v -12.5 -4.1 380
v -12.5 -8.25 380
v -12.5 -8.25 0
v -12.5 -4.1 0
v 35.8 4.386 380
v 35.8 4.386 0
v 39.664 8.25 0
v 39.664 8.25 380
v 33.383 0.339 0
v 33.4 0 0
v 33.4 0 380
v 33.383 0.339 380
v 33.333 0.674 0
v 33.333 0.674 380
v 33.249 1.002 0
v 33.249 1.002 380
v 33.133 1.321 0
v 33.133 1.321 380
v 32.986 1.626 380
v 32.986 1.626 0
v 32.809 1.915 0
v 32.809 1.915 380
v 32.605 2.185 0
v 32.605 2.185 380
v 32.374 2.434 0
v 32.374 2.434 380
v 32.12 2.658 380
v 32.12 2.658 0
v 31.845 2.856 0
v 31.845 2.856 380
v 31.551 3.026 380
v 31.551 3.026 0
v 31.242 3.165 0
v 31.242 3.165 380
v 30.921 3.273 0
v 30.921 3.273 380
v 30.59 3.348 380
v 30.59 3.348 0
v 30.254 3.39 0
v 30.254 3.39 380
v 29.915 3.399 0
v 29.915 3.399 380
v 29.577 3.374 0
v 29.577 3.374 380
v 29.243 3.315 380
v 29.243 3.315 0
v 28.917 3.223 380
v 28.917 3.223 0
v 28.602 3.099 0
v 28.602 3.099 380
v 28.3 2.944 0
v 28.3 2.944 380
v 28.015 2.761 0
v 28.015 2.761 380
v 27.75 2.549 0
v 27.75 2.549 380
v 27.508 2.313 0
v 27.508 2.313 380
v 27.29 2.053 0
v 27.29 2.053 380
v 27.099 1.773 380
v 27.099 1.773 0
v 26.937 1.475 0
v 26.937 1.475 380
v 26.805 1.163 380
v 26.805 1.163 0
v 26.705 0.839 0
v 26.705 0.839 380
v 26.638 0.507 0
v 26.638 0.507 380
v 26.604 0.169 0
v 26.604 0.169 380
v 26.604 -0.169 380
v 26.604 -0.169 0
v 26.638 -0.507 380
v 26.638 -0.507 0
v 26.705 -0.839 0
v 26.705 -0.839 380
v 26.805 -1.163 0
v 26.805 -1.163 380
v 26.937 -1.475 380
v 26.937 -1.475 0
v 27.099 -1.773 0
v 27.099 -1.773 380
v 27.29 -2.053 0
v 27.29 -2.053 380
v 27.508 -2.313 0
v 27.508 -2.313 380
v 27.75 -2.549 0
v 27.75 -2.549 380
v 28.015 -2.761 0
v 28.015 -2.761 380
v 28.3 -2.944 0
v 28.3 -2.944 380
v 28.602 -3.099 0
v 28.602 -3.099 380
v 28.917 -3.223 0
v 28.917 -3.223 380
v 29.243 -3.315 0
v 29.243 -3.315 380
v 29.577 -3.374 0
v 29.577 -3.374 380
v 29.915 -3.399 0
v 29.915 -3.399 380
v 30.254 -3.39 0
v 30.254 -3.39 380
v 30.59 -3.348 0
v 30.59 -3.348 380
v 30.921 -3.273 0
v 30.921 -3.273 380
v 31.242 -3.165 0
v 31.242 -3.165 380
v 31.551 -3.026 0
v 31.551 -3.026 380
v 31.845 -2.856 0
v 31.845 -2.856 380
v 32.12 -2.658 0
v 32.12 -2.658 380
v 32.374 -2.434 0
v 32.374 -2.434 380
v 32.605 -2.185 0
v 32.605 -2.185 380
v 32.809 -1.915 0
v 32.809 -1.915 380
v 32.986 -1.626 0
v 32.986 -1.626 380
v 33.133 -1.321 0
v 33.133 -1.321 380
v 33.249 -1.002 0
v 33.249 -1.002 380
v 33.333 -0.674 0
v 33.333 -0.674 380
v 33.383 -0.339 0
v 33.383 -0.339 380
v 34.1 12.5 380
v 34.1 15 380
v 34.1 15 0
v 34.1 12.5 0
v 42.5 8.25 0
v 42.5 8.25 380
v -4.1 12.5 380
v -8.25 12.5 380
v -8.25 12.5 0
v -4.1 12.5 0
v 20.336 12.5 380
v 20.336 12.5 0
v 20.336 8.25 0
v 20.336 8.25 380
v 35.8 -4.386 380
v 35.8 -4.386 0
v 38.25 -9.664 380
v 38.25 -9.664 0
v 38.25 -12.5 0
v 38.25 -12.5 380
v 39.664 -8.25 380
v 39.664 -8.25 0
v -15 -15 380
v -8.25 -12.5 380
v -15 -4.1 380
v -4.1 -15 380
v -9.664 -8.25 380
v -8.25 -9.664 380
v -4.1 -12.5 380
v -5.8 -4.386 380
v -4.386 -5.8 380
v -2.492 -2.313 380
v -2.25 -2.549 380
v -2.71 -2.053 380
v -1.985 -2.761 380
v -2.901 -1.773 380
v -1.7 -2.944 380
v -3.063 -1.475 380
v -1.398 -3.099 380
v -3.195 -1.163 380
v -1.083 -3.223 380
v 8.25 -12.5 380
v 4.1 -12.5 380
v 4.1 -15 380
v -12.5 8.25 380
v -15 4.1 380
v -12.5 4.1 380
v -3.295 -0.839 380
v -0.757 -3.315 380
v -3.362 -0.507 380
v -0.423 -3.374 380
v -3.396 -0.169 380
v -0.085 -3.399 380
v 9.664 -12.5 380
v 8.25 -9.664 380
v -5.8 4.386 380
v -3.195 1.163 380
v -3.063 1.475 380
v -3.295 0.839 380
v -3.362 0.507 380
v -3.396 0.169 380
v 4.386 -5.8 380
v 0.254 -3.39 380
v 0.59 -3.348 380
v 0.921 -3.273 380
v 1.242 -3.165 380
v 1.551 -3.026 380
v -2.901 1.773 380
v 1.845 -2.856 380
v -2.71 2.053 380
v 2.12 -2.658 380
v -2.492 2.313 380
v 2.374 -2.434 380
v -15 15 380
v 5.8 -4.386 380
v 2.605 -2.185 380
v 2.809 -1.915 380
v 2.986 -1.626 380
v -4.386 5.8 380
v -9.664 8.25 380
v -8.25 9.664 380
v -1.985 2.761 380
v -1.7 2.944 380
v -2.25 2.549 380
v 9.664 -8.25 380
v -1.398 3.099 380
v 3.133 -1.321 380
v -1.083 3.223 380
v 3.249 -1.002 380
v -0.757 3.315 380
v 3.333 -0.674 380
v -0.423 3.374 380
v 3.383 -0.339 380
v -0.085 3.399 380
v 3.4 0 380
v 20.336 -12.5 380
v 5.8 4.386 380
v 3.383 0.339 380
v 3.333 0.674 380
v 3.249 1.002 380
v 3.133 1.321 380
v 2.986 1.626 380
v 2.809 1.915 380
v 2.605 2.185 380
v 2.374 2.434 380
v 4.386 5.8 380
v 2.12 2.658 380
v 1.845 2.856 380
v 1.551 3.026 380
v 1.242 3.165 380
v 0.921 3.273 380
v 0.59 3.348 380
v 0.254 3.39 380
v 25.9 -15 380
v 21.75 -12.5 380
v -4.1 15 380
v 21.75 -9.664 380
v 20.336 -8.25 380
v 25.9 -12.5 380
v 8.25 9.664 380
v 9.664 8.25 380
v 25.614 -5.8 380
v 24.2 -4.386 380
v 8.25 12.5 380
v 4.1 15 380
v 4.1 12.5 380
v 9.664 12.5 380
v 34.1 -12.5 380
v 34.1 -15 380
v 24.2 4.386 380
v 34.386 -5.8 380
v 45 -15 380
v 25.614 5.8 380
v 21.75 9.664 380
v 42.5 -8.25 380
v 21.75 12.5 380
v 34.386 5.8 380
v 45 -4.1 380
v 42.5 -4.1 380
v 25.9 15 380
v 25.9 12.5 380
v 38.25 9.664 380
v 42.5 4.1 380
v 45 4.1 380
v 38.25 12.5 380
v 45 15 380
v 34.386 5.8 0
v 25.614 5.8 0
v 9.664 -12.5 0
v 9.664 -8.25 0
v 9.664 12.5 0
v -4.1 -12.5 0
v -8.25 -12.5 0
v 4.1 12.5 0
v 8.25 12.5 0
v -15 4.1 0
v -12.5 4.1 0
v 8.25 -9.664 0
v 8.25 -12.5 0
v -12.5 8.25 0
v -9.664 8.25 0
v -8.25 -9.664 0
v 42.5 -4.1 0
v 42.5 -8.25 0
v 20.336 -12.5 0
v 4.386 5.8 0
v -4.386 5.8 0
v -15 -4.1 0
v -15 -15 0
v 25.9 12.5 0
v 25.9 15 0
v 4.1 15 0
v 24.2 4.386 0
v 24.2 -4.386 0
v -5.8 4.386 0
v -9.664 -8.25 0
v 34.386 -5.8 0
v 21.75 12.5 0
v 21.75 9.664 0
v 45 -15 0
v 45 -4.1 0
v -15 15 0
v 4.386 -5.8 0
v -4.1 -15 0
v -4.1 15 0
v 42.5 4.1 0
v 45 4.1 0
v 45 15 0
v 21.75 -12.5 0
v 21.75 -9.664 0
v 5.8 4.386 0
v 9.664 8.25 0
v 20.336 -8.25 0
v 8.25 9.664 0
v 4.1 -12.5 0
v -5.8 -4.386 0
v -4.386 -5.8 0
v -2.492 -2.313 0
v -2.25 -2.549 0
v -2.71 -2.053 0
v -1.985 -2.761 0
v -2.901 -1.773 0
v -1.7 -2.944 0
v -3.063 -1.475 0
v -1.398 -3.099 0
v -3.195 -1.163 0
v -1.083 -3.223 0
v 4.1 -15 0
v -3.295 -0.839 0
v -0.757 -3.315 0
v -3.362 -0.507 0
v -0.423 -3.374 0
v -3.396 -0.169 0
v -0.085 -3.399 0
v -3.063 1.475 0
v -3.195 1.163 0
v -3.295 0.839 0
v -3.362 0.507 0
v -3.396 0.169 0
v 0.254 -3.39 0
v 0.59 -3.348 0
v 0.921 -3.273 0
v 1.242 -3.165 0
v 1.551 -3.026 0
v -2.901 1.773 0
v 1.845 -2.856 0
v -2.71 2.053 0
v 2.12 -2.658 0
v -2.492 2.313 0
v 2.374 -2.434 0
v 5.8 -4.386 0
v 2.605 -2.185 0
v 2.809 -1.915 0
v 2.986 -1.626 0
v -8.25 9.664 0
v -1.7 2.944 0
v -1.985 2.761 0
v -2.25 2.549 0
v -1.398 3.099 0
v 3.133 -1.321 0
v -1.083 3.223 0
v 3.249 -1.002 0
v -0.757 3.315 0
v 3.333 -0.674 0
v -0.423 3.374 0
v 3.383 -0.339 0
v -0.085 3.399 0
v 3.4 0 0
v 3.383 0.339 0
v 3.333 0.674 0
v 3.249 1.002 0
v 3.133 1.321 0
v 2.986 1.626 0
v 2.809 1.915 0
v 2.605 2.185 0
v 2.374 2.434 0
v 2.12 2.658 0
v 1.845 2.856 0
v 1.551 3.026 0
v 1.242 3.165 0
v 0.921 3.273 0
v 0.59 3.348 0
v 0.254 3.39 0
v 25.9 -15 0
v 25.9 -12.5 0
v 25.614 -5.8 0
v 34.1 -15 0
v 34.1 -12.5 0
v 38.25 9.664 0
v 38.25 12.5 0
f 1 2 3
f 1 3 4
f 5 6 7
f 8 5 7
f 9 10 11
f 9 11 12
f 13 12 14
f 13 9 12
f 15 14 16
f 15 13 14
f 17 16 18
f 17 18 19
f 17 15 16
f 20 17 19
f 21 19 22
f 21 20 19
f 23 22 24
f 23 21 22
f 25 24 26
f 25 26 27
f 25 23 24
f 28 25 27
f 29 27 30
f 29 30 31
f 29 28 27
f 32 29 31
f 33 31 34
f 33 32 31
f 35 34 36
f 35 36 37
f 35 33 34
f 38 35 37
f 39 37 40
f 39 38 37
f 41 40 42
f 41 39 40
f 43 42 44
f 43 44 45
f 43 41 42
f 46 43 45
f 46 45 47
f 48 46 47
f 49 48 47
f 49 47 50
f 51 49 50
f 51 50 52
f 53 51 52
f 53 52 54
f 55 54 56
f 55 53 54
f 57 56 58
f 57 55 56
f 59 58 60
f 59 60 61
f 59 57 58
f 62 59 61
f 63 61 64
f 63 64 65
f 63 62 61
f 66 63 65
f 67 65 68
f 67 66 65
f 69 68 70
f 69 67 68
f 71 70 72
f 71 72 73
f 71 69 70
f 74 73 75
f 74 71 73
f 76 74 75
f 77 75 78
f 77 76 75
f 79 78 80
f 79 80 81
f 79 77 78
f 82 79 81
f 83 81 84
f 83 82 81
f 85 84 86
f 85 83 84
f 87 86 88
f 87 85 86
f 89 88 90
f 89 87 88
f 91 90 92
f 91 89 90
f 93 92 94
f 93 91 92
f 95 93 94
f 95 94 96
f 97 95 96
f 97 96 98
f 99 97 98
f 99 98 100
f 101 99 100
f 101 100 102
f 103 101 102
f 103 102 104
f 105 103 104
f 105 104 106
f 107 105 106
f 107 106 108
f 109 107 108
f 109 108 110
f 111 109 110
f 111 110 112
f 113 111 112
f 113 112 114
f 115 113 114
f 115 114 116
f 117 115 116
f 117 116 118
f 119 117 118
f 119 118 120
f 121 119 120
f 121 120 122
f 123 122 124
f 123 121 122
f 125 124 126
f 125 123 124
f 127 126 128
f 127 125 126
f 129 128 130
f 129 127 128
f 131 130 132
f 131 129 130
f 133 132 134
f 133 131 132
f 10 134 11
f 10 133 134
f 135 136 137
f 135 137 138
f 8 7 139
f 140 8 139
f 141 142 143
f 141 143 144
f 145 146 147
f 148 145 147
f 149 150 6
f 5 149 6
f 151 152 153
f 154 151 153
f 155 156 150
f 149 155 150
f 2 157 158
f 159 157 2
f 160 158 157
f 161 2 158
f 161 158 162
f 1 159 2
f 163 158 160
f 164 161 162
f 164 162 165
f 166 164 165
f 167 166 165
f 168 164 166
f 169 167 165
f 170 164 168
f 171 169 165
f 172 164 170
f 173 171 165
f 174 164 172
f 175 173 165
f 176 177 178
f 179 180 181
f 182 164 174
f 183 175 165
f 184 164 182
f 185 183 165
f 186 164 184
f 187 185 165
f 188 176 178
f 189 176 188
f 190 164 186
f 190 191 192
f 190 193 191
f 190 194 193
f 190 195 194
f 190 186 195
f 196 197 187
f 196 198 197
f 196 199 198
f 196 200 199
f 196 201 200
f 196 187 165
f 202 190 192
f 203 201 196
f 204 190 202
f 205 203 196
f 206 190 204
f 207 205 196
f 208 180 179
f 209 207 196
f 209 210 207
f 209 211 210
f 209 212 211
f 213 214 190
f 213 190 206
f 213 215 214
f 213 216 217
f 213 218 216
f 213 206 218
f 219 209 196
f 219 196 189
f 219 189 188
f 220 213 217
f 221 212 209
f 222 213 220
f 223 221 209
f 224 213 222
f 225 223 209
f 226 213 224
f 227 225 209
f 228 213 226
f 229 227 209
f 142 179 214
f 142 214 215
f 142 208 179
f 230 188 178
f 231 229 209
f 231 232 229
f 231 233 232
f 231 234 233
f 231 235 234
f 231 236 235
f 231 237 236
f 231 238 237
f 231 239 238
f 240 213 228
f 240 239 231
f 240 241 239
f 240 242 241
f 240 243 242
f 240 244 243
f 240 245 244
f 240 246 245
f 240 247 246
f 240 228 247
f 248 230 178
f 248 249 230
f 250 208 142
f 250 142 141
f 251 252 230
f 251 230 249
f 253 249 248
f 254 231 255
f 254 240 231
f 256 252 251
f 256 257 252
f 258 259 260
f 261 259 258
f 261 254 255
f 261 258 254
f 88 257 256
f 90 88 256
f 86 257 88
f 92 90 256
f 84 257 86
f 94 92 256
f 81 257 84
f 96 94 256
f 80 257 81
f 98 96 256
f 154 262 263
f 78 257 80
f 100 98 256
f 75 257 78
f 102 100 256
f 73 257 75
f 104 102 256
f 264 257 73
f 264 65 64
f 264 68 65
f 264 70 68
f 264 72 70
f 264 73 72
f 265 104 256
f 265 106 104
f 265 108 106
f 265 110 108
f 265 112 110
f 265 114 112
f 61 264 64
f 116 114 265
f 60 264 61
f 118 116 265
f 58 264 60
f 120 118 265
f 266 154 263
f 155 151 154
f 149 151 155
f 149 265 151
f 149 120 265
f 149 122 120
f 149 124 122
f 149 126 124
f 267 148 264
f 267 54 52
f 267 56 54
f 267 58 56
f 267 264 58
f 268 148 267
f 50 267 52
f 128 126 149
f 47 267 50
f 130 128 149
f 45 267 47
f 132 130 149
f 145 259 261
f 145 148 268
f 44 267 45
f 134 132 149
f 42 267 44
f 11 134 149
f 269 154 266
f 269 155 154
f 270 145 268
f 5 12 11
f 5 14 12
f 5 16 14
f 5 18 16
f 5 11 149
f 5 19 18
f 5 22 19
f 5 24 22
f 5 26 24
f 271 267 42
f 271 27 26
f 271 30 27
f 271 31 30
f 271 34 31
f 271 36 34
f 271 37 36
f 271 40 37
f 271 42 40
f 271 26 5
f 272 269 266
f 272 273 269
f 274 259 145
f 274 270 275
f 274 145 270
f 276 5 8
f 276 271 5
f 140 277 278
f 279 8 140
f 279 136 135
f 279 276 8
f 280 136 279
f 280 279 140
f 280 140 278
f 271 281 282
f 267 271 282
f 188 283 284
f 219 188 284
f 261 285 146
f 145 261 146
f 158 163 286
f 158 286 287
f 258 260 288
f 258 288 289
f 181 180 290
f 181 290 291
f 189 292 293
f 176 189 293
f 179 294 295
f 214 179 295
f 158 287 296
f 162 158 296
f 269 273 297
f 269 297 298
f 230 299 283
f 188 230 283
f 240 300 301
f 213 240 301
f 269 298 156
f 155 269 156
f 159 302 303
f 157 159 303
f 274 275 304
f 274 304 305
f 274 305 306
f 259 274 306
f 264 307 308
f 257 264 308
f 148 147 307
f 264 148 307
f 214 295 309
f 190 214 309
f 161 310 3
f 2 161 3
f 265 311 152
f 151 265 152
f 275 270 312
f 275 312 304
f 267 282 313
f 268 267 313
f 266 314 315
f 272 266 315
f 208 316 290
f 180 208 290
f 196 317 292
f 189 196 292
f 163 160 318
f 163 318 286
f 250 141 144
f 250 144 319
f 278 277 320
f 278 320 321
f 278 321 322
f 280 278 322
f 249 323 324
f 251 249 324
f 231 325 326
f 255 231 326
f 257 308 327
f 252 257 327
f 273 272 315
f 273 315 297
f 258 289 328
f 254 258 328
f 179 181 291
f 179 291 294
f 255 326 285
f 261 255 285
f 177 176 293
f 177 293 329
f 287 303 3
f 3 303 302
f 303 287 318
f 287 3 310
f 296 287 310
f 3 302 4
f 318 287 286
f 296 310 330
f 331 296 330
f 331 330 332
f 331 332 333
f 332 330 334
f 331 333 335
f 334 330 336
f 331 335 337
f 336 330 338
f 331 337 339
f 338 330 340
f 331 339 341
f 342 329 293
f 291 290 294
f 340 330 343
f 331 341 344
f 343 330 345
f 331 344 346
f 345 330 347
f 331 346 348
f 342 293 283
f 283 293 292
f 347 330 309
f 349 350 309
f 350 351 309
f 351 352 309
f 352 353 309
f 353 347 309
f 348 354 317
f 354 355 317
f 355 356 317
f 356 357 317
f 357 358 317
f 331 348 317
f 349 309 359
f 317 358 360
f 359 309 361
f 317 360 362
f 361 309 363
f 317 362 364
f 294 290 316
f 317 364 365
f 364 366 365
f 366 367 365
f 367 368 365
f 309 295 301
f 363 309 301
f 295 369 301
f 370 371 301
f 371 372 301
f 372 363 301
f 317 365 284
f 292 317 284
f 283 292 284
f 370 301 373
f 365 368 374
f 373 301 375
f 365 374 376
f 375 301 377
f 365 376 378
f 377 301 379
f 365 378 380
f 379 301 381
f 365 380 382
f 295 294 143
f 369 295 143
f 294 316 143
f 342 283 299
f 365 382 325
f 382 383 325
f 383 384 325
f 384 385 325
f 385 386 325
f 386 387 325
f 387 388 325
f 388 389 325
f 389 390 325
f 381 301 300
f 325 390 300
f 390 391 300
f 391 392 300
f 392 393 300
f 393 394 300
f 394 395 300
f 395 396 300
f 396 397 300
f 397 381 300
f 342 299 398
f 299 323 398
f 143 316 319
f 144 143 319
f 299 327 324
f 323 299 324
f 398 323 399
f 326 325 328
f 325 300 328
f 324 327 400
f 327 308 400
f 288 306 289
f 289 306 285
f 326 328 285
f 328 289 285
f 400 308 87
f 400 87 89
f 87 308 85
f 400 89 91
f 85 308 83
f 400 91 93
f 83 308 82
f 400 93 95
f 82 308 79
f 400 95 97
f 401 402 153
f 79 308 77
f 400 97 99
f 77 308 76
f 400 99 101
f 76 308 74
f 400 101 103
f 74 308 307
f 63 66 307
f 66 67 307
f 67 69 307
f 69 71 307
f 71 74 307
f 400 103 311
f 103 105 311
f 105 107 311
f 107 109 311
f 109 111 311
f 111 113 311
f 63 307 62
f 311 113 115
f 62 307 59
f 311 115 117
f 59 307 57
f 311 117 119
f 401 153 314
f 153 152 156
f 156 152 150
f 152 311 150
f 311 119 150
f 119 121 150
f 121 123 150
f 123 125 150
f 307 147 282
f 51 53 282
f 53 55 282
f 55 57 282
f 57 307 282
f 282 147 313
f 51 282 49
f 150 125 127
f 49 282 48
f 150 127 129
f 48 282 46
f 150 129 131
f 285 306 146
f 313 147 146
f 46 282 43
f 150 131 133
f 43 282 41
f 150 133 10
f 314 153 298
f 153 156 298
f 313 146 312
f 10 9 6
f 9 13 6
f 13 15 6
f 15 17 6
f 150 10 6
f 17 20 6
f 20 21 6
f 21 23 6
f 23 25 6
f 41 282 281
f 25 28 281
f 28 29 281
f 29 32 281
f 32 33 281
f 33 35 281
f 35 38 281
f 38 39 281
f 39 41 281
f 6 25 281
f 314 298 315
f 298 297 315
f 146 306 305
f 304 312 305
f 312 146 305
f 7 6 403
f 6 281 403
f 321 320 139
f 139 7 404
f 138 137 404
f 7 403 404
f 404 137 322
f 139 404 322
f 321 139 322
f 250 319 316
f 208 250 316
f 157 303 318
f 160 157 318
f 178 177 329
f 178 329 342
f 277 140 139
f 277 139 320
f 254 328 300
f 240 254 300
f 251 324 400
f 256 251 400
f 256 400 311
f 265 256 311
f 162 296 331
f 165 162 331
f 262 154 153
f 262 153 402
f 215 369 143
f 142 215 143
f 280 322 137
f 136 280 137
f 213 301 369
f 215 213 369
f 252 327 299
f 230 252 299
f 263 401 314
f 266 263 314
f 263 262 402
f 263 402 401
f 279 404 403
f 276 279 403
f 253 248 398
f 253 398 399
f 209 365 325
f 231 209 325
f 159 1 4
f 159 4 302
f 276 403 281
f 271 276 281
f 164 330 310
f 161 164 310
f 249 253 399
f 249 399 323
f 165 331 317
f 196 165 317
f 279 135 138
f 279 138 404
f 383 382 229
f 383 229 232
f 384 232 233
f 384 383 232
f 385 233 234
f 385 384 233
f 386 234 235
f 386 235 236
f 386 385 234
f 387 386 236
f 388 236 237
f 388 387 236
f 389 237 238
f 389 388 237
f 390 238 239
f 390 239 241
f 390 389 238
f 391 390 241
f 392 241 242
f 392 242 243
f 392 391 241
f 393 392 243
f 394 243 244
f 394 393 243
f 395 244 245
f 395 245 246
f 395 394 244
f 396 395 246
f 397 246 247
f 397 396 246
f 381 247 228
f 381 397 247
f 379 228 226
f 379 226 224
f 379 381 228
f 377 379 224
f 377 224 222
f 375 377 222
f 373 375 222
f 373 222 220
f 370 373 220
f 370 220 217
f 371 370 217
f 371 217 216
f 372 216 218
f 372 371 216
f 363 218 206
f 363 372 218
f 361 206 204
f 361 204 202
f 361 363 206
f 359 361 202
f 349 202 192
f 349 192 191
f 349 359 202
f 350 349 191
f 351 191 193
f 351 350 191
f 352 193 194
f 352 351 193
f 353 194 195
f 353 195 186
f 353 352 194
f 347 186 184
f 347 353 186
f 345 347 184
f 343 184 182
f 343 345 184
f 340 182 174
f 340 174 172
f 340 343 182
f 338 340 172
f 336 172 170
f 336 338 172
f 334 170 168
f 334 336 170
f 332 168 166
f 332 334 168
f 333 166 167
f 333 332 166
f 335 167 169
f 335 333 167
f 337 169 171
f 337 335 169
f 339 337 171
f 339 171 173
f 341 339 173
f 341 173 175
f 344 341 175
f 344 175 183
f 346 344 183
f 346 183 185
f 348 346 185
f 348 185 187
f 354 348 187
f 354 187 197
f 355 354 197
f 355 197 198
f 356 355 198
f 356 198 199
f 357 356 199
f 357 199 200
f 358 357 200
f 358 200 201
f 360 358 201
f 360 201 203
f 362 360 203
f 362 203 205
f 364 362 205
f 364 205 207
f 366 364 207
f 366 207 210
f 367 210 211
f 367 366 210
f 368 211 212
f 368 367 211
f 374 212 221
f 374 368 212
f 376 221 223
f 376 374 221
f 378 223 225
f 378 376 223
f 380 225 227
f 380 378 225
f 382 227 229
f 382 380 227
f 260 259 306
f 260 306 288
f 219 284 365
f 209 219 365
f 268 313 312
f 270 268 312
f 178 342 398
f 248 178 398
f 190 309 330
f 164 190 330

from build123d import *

# Parameters (mm, degrees)
SKETCH_1_R      = 3.4
EXTRUDE_1_DEPTH = 380


with BuildPart() as part:
    # 草图1 → 凸台-拉伸1 (new body)
    with BuildSketch(Plane.XY):
        Polygon((-4.1, 12.5), (-4.1, 15), (-8.25, 15), (-15, 15), (-15, 8.25), (-15, 4.1), (-12.5, 4.1), (-12.5, 8.25), (-9.664213562, 8.25), (-5.8, 4.385786438), (-5.8, -4.385786438), (-9.664213562, -8.25), (-12.5, -8.25), (-12.5, -4.1), (-15, -4.1), (-15, -8.25), (-15, -15), (-8.25, -15), (-4.1, -15), (-4.1, -12.5), (-8.25, -12.5), (-8.25, -9.664213562), (-4.385786438, -5.8), (4.385786438, -5.8), (8.25, -9.664213562), (8.25, -12.5), (4.1, -12.5), (4.1, -15), (8.25, -15), (15, -15), (21.75, -15), (25.9, -15), (25.9, -12.5), (21.75, -12.5), (21.75, -9.664213562), (25.614213562, -5.8), (34.385786438, -5.8), (38.25, -9.664213562), (38.25, -12.5), (34.1, -12.5), (34.1, -15), (38.25, -15), (45, -15), (45, -8.25), (45, -4.1), (42.5, -4.1), (42.5, -8.25), (39.664213562, -8.25), (35.8, -4.385786438), (35.8, 4.385786438), (39.664213562, 8.25), (42.5, 8.25), (42.5, 4.1), (45, 4.1), (45, 8.25), (45, 15), (38.25, 15), (34.1, 15), (34.1, 12.5), (38.25, 12.5), (38.25, 9.664213562), (34.385786438, 5.8), (25.614213562, 5.8), (21.75, 9.664213562), (21.75, 12.5), (25.9, 12.5), (25.9, 15), (21.75, 15), (15, 15), (8.25, 15), (4.1, 15), (4.1, 12.5), (8.25, 12.5), (8.25, 9.664213562), (4.385786438, 5.8), (-4.385786438, 5.8), (-8.25, 9.664213562), (-8.25, 12.5), align=None)
        Circle(SKETCH_1_R, mode=Mode.SUBTRACT)
        Polygon((9.664213562, -8.25), (5.8, -4.385786438), (5.8, 4.385786438), (9.664213562, 8.25), (9.664213562, 12.5), (20.335786438, 12.5), (20.335786438, 8.25), (24.2, 4.385786438), (24.2, -4.385786438), (20.335786438, -8.25), (20.335786438, -12.5), (9.664213562, -12.5), align=None, mode=Mode.SUBTRACT)
        with Locations((30, 0)):
            Circle(SKETCH_1_R, mode=Mode.SUBTRACT)
    extrude(amount=EXTRUDE_1_DEPTH)


solid = part.part
